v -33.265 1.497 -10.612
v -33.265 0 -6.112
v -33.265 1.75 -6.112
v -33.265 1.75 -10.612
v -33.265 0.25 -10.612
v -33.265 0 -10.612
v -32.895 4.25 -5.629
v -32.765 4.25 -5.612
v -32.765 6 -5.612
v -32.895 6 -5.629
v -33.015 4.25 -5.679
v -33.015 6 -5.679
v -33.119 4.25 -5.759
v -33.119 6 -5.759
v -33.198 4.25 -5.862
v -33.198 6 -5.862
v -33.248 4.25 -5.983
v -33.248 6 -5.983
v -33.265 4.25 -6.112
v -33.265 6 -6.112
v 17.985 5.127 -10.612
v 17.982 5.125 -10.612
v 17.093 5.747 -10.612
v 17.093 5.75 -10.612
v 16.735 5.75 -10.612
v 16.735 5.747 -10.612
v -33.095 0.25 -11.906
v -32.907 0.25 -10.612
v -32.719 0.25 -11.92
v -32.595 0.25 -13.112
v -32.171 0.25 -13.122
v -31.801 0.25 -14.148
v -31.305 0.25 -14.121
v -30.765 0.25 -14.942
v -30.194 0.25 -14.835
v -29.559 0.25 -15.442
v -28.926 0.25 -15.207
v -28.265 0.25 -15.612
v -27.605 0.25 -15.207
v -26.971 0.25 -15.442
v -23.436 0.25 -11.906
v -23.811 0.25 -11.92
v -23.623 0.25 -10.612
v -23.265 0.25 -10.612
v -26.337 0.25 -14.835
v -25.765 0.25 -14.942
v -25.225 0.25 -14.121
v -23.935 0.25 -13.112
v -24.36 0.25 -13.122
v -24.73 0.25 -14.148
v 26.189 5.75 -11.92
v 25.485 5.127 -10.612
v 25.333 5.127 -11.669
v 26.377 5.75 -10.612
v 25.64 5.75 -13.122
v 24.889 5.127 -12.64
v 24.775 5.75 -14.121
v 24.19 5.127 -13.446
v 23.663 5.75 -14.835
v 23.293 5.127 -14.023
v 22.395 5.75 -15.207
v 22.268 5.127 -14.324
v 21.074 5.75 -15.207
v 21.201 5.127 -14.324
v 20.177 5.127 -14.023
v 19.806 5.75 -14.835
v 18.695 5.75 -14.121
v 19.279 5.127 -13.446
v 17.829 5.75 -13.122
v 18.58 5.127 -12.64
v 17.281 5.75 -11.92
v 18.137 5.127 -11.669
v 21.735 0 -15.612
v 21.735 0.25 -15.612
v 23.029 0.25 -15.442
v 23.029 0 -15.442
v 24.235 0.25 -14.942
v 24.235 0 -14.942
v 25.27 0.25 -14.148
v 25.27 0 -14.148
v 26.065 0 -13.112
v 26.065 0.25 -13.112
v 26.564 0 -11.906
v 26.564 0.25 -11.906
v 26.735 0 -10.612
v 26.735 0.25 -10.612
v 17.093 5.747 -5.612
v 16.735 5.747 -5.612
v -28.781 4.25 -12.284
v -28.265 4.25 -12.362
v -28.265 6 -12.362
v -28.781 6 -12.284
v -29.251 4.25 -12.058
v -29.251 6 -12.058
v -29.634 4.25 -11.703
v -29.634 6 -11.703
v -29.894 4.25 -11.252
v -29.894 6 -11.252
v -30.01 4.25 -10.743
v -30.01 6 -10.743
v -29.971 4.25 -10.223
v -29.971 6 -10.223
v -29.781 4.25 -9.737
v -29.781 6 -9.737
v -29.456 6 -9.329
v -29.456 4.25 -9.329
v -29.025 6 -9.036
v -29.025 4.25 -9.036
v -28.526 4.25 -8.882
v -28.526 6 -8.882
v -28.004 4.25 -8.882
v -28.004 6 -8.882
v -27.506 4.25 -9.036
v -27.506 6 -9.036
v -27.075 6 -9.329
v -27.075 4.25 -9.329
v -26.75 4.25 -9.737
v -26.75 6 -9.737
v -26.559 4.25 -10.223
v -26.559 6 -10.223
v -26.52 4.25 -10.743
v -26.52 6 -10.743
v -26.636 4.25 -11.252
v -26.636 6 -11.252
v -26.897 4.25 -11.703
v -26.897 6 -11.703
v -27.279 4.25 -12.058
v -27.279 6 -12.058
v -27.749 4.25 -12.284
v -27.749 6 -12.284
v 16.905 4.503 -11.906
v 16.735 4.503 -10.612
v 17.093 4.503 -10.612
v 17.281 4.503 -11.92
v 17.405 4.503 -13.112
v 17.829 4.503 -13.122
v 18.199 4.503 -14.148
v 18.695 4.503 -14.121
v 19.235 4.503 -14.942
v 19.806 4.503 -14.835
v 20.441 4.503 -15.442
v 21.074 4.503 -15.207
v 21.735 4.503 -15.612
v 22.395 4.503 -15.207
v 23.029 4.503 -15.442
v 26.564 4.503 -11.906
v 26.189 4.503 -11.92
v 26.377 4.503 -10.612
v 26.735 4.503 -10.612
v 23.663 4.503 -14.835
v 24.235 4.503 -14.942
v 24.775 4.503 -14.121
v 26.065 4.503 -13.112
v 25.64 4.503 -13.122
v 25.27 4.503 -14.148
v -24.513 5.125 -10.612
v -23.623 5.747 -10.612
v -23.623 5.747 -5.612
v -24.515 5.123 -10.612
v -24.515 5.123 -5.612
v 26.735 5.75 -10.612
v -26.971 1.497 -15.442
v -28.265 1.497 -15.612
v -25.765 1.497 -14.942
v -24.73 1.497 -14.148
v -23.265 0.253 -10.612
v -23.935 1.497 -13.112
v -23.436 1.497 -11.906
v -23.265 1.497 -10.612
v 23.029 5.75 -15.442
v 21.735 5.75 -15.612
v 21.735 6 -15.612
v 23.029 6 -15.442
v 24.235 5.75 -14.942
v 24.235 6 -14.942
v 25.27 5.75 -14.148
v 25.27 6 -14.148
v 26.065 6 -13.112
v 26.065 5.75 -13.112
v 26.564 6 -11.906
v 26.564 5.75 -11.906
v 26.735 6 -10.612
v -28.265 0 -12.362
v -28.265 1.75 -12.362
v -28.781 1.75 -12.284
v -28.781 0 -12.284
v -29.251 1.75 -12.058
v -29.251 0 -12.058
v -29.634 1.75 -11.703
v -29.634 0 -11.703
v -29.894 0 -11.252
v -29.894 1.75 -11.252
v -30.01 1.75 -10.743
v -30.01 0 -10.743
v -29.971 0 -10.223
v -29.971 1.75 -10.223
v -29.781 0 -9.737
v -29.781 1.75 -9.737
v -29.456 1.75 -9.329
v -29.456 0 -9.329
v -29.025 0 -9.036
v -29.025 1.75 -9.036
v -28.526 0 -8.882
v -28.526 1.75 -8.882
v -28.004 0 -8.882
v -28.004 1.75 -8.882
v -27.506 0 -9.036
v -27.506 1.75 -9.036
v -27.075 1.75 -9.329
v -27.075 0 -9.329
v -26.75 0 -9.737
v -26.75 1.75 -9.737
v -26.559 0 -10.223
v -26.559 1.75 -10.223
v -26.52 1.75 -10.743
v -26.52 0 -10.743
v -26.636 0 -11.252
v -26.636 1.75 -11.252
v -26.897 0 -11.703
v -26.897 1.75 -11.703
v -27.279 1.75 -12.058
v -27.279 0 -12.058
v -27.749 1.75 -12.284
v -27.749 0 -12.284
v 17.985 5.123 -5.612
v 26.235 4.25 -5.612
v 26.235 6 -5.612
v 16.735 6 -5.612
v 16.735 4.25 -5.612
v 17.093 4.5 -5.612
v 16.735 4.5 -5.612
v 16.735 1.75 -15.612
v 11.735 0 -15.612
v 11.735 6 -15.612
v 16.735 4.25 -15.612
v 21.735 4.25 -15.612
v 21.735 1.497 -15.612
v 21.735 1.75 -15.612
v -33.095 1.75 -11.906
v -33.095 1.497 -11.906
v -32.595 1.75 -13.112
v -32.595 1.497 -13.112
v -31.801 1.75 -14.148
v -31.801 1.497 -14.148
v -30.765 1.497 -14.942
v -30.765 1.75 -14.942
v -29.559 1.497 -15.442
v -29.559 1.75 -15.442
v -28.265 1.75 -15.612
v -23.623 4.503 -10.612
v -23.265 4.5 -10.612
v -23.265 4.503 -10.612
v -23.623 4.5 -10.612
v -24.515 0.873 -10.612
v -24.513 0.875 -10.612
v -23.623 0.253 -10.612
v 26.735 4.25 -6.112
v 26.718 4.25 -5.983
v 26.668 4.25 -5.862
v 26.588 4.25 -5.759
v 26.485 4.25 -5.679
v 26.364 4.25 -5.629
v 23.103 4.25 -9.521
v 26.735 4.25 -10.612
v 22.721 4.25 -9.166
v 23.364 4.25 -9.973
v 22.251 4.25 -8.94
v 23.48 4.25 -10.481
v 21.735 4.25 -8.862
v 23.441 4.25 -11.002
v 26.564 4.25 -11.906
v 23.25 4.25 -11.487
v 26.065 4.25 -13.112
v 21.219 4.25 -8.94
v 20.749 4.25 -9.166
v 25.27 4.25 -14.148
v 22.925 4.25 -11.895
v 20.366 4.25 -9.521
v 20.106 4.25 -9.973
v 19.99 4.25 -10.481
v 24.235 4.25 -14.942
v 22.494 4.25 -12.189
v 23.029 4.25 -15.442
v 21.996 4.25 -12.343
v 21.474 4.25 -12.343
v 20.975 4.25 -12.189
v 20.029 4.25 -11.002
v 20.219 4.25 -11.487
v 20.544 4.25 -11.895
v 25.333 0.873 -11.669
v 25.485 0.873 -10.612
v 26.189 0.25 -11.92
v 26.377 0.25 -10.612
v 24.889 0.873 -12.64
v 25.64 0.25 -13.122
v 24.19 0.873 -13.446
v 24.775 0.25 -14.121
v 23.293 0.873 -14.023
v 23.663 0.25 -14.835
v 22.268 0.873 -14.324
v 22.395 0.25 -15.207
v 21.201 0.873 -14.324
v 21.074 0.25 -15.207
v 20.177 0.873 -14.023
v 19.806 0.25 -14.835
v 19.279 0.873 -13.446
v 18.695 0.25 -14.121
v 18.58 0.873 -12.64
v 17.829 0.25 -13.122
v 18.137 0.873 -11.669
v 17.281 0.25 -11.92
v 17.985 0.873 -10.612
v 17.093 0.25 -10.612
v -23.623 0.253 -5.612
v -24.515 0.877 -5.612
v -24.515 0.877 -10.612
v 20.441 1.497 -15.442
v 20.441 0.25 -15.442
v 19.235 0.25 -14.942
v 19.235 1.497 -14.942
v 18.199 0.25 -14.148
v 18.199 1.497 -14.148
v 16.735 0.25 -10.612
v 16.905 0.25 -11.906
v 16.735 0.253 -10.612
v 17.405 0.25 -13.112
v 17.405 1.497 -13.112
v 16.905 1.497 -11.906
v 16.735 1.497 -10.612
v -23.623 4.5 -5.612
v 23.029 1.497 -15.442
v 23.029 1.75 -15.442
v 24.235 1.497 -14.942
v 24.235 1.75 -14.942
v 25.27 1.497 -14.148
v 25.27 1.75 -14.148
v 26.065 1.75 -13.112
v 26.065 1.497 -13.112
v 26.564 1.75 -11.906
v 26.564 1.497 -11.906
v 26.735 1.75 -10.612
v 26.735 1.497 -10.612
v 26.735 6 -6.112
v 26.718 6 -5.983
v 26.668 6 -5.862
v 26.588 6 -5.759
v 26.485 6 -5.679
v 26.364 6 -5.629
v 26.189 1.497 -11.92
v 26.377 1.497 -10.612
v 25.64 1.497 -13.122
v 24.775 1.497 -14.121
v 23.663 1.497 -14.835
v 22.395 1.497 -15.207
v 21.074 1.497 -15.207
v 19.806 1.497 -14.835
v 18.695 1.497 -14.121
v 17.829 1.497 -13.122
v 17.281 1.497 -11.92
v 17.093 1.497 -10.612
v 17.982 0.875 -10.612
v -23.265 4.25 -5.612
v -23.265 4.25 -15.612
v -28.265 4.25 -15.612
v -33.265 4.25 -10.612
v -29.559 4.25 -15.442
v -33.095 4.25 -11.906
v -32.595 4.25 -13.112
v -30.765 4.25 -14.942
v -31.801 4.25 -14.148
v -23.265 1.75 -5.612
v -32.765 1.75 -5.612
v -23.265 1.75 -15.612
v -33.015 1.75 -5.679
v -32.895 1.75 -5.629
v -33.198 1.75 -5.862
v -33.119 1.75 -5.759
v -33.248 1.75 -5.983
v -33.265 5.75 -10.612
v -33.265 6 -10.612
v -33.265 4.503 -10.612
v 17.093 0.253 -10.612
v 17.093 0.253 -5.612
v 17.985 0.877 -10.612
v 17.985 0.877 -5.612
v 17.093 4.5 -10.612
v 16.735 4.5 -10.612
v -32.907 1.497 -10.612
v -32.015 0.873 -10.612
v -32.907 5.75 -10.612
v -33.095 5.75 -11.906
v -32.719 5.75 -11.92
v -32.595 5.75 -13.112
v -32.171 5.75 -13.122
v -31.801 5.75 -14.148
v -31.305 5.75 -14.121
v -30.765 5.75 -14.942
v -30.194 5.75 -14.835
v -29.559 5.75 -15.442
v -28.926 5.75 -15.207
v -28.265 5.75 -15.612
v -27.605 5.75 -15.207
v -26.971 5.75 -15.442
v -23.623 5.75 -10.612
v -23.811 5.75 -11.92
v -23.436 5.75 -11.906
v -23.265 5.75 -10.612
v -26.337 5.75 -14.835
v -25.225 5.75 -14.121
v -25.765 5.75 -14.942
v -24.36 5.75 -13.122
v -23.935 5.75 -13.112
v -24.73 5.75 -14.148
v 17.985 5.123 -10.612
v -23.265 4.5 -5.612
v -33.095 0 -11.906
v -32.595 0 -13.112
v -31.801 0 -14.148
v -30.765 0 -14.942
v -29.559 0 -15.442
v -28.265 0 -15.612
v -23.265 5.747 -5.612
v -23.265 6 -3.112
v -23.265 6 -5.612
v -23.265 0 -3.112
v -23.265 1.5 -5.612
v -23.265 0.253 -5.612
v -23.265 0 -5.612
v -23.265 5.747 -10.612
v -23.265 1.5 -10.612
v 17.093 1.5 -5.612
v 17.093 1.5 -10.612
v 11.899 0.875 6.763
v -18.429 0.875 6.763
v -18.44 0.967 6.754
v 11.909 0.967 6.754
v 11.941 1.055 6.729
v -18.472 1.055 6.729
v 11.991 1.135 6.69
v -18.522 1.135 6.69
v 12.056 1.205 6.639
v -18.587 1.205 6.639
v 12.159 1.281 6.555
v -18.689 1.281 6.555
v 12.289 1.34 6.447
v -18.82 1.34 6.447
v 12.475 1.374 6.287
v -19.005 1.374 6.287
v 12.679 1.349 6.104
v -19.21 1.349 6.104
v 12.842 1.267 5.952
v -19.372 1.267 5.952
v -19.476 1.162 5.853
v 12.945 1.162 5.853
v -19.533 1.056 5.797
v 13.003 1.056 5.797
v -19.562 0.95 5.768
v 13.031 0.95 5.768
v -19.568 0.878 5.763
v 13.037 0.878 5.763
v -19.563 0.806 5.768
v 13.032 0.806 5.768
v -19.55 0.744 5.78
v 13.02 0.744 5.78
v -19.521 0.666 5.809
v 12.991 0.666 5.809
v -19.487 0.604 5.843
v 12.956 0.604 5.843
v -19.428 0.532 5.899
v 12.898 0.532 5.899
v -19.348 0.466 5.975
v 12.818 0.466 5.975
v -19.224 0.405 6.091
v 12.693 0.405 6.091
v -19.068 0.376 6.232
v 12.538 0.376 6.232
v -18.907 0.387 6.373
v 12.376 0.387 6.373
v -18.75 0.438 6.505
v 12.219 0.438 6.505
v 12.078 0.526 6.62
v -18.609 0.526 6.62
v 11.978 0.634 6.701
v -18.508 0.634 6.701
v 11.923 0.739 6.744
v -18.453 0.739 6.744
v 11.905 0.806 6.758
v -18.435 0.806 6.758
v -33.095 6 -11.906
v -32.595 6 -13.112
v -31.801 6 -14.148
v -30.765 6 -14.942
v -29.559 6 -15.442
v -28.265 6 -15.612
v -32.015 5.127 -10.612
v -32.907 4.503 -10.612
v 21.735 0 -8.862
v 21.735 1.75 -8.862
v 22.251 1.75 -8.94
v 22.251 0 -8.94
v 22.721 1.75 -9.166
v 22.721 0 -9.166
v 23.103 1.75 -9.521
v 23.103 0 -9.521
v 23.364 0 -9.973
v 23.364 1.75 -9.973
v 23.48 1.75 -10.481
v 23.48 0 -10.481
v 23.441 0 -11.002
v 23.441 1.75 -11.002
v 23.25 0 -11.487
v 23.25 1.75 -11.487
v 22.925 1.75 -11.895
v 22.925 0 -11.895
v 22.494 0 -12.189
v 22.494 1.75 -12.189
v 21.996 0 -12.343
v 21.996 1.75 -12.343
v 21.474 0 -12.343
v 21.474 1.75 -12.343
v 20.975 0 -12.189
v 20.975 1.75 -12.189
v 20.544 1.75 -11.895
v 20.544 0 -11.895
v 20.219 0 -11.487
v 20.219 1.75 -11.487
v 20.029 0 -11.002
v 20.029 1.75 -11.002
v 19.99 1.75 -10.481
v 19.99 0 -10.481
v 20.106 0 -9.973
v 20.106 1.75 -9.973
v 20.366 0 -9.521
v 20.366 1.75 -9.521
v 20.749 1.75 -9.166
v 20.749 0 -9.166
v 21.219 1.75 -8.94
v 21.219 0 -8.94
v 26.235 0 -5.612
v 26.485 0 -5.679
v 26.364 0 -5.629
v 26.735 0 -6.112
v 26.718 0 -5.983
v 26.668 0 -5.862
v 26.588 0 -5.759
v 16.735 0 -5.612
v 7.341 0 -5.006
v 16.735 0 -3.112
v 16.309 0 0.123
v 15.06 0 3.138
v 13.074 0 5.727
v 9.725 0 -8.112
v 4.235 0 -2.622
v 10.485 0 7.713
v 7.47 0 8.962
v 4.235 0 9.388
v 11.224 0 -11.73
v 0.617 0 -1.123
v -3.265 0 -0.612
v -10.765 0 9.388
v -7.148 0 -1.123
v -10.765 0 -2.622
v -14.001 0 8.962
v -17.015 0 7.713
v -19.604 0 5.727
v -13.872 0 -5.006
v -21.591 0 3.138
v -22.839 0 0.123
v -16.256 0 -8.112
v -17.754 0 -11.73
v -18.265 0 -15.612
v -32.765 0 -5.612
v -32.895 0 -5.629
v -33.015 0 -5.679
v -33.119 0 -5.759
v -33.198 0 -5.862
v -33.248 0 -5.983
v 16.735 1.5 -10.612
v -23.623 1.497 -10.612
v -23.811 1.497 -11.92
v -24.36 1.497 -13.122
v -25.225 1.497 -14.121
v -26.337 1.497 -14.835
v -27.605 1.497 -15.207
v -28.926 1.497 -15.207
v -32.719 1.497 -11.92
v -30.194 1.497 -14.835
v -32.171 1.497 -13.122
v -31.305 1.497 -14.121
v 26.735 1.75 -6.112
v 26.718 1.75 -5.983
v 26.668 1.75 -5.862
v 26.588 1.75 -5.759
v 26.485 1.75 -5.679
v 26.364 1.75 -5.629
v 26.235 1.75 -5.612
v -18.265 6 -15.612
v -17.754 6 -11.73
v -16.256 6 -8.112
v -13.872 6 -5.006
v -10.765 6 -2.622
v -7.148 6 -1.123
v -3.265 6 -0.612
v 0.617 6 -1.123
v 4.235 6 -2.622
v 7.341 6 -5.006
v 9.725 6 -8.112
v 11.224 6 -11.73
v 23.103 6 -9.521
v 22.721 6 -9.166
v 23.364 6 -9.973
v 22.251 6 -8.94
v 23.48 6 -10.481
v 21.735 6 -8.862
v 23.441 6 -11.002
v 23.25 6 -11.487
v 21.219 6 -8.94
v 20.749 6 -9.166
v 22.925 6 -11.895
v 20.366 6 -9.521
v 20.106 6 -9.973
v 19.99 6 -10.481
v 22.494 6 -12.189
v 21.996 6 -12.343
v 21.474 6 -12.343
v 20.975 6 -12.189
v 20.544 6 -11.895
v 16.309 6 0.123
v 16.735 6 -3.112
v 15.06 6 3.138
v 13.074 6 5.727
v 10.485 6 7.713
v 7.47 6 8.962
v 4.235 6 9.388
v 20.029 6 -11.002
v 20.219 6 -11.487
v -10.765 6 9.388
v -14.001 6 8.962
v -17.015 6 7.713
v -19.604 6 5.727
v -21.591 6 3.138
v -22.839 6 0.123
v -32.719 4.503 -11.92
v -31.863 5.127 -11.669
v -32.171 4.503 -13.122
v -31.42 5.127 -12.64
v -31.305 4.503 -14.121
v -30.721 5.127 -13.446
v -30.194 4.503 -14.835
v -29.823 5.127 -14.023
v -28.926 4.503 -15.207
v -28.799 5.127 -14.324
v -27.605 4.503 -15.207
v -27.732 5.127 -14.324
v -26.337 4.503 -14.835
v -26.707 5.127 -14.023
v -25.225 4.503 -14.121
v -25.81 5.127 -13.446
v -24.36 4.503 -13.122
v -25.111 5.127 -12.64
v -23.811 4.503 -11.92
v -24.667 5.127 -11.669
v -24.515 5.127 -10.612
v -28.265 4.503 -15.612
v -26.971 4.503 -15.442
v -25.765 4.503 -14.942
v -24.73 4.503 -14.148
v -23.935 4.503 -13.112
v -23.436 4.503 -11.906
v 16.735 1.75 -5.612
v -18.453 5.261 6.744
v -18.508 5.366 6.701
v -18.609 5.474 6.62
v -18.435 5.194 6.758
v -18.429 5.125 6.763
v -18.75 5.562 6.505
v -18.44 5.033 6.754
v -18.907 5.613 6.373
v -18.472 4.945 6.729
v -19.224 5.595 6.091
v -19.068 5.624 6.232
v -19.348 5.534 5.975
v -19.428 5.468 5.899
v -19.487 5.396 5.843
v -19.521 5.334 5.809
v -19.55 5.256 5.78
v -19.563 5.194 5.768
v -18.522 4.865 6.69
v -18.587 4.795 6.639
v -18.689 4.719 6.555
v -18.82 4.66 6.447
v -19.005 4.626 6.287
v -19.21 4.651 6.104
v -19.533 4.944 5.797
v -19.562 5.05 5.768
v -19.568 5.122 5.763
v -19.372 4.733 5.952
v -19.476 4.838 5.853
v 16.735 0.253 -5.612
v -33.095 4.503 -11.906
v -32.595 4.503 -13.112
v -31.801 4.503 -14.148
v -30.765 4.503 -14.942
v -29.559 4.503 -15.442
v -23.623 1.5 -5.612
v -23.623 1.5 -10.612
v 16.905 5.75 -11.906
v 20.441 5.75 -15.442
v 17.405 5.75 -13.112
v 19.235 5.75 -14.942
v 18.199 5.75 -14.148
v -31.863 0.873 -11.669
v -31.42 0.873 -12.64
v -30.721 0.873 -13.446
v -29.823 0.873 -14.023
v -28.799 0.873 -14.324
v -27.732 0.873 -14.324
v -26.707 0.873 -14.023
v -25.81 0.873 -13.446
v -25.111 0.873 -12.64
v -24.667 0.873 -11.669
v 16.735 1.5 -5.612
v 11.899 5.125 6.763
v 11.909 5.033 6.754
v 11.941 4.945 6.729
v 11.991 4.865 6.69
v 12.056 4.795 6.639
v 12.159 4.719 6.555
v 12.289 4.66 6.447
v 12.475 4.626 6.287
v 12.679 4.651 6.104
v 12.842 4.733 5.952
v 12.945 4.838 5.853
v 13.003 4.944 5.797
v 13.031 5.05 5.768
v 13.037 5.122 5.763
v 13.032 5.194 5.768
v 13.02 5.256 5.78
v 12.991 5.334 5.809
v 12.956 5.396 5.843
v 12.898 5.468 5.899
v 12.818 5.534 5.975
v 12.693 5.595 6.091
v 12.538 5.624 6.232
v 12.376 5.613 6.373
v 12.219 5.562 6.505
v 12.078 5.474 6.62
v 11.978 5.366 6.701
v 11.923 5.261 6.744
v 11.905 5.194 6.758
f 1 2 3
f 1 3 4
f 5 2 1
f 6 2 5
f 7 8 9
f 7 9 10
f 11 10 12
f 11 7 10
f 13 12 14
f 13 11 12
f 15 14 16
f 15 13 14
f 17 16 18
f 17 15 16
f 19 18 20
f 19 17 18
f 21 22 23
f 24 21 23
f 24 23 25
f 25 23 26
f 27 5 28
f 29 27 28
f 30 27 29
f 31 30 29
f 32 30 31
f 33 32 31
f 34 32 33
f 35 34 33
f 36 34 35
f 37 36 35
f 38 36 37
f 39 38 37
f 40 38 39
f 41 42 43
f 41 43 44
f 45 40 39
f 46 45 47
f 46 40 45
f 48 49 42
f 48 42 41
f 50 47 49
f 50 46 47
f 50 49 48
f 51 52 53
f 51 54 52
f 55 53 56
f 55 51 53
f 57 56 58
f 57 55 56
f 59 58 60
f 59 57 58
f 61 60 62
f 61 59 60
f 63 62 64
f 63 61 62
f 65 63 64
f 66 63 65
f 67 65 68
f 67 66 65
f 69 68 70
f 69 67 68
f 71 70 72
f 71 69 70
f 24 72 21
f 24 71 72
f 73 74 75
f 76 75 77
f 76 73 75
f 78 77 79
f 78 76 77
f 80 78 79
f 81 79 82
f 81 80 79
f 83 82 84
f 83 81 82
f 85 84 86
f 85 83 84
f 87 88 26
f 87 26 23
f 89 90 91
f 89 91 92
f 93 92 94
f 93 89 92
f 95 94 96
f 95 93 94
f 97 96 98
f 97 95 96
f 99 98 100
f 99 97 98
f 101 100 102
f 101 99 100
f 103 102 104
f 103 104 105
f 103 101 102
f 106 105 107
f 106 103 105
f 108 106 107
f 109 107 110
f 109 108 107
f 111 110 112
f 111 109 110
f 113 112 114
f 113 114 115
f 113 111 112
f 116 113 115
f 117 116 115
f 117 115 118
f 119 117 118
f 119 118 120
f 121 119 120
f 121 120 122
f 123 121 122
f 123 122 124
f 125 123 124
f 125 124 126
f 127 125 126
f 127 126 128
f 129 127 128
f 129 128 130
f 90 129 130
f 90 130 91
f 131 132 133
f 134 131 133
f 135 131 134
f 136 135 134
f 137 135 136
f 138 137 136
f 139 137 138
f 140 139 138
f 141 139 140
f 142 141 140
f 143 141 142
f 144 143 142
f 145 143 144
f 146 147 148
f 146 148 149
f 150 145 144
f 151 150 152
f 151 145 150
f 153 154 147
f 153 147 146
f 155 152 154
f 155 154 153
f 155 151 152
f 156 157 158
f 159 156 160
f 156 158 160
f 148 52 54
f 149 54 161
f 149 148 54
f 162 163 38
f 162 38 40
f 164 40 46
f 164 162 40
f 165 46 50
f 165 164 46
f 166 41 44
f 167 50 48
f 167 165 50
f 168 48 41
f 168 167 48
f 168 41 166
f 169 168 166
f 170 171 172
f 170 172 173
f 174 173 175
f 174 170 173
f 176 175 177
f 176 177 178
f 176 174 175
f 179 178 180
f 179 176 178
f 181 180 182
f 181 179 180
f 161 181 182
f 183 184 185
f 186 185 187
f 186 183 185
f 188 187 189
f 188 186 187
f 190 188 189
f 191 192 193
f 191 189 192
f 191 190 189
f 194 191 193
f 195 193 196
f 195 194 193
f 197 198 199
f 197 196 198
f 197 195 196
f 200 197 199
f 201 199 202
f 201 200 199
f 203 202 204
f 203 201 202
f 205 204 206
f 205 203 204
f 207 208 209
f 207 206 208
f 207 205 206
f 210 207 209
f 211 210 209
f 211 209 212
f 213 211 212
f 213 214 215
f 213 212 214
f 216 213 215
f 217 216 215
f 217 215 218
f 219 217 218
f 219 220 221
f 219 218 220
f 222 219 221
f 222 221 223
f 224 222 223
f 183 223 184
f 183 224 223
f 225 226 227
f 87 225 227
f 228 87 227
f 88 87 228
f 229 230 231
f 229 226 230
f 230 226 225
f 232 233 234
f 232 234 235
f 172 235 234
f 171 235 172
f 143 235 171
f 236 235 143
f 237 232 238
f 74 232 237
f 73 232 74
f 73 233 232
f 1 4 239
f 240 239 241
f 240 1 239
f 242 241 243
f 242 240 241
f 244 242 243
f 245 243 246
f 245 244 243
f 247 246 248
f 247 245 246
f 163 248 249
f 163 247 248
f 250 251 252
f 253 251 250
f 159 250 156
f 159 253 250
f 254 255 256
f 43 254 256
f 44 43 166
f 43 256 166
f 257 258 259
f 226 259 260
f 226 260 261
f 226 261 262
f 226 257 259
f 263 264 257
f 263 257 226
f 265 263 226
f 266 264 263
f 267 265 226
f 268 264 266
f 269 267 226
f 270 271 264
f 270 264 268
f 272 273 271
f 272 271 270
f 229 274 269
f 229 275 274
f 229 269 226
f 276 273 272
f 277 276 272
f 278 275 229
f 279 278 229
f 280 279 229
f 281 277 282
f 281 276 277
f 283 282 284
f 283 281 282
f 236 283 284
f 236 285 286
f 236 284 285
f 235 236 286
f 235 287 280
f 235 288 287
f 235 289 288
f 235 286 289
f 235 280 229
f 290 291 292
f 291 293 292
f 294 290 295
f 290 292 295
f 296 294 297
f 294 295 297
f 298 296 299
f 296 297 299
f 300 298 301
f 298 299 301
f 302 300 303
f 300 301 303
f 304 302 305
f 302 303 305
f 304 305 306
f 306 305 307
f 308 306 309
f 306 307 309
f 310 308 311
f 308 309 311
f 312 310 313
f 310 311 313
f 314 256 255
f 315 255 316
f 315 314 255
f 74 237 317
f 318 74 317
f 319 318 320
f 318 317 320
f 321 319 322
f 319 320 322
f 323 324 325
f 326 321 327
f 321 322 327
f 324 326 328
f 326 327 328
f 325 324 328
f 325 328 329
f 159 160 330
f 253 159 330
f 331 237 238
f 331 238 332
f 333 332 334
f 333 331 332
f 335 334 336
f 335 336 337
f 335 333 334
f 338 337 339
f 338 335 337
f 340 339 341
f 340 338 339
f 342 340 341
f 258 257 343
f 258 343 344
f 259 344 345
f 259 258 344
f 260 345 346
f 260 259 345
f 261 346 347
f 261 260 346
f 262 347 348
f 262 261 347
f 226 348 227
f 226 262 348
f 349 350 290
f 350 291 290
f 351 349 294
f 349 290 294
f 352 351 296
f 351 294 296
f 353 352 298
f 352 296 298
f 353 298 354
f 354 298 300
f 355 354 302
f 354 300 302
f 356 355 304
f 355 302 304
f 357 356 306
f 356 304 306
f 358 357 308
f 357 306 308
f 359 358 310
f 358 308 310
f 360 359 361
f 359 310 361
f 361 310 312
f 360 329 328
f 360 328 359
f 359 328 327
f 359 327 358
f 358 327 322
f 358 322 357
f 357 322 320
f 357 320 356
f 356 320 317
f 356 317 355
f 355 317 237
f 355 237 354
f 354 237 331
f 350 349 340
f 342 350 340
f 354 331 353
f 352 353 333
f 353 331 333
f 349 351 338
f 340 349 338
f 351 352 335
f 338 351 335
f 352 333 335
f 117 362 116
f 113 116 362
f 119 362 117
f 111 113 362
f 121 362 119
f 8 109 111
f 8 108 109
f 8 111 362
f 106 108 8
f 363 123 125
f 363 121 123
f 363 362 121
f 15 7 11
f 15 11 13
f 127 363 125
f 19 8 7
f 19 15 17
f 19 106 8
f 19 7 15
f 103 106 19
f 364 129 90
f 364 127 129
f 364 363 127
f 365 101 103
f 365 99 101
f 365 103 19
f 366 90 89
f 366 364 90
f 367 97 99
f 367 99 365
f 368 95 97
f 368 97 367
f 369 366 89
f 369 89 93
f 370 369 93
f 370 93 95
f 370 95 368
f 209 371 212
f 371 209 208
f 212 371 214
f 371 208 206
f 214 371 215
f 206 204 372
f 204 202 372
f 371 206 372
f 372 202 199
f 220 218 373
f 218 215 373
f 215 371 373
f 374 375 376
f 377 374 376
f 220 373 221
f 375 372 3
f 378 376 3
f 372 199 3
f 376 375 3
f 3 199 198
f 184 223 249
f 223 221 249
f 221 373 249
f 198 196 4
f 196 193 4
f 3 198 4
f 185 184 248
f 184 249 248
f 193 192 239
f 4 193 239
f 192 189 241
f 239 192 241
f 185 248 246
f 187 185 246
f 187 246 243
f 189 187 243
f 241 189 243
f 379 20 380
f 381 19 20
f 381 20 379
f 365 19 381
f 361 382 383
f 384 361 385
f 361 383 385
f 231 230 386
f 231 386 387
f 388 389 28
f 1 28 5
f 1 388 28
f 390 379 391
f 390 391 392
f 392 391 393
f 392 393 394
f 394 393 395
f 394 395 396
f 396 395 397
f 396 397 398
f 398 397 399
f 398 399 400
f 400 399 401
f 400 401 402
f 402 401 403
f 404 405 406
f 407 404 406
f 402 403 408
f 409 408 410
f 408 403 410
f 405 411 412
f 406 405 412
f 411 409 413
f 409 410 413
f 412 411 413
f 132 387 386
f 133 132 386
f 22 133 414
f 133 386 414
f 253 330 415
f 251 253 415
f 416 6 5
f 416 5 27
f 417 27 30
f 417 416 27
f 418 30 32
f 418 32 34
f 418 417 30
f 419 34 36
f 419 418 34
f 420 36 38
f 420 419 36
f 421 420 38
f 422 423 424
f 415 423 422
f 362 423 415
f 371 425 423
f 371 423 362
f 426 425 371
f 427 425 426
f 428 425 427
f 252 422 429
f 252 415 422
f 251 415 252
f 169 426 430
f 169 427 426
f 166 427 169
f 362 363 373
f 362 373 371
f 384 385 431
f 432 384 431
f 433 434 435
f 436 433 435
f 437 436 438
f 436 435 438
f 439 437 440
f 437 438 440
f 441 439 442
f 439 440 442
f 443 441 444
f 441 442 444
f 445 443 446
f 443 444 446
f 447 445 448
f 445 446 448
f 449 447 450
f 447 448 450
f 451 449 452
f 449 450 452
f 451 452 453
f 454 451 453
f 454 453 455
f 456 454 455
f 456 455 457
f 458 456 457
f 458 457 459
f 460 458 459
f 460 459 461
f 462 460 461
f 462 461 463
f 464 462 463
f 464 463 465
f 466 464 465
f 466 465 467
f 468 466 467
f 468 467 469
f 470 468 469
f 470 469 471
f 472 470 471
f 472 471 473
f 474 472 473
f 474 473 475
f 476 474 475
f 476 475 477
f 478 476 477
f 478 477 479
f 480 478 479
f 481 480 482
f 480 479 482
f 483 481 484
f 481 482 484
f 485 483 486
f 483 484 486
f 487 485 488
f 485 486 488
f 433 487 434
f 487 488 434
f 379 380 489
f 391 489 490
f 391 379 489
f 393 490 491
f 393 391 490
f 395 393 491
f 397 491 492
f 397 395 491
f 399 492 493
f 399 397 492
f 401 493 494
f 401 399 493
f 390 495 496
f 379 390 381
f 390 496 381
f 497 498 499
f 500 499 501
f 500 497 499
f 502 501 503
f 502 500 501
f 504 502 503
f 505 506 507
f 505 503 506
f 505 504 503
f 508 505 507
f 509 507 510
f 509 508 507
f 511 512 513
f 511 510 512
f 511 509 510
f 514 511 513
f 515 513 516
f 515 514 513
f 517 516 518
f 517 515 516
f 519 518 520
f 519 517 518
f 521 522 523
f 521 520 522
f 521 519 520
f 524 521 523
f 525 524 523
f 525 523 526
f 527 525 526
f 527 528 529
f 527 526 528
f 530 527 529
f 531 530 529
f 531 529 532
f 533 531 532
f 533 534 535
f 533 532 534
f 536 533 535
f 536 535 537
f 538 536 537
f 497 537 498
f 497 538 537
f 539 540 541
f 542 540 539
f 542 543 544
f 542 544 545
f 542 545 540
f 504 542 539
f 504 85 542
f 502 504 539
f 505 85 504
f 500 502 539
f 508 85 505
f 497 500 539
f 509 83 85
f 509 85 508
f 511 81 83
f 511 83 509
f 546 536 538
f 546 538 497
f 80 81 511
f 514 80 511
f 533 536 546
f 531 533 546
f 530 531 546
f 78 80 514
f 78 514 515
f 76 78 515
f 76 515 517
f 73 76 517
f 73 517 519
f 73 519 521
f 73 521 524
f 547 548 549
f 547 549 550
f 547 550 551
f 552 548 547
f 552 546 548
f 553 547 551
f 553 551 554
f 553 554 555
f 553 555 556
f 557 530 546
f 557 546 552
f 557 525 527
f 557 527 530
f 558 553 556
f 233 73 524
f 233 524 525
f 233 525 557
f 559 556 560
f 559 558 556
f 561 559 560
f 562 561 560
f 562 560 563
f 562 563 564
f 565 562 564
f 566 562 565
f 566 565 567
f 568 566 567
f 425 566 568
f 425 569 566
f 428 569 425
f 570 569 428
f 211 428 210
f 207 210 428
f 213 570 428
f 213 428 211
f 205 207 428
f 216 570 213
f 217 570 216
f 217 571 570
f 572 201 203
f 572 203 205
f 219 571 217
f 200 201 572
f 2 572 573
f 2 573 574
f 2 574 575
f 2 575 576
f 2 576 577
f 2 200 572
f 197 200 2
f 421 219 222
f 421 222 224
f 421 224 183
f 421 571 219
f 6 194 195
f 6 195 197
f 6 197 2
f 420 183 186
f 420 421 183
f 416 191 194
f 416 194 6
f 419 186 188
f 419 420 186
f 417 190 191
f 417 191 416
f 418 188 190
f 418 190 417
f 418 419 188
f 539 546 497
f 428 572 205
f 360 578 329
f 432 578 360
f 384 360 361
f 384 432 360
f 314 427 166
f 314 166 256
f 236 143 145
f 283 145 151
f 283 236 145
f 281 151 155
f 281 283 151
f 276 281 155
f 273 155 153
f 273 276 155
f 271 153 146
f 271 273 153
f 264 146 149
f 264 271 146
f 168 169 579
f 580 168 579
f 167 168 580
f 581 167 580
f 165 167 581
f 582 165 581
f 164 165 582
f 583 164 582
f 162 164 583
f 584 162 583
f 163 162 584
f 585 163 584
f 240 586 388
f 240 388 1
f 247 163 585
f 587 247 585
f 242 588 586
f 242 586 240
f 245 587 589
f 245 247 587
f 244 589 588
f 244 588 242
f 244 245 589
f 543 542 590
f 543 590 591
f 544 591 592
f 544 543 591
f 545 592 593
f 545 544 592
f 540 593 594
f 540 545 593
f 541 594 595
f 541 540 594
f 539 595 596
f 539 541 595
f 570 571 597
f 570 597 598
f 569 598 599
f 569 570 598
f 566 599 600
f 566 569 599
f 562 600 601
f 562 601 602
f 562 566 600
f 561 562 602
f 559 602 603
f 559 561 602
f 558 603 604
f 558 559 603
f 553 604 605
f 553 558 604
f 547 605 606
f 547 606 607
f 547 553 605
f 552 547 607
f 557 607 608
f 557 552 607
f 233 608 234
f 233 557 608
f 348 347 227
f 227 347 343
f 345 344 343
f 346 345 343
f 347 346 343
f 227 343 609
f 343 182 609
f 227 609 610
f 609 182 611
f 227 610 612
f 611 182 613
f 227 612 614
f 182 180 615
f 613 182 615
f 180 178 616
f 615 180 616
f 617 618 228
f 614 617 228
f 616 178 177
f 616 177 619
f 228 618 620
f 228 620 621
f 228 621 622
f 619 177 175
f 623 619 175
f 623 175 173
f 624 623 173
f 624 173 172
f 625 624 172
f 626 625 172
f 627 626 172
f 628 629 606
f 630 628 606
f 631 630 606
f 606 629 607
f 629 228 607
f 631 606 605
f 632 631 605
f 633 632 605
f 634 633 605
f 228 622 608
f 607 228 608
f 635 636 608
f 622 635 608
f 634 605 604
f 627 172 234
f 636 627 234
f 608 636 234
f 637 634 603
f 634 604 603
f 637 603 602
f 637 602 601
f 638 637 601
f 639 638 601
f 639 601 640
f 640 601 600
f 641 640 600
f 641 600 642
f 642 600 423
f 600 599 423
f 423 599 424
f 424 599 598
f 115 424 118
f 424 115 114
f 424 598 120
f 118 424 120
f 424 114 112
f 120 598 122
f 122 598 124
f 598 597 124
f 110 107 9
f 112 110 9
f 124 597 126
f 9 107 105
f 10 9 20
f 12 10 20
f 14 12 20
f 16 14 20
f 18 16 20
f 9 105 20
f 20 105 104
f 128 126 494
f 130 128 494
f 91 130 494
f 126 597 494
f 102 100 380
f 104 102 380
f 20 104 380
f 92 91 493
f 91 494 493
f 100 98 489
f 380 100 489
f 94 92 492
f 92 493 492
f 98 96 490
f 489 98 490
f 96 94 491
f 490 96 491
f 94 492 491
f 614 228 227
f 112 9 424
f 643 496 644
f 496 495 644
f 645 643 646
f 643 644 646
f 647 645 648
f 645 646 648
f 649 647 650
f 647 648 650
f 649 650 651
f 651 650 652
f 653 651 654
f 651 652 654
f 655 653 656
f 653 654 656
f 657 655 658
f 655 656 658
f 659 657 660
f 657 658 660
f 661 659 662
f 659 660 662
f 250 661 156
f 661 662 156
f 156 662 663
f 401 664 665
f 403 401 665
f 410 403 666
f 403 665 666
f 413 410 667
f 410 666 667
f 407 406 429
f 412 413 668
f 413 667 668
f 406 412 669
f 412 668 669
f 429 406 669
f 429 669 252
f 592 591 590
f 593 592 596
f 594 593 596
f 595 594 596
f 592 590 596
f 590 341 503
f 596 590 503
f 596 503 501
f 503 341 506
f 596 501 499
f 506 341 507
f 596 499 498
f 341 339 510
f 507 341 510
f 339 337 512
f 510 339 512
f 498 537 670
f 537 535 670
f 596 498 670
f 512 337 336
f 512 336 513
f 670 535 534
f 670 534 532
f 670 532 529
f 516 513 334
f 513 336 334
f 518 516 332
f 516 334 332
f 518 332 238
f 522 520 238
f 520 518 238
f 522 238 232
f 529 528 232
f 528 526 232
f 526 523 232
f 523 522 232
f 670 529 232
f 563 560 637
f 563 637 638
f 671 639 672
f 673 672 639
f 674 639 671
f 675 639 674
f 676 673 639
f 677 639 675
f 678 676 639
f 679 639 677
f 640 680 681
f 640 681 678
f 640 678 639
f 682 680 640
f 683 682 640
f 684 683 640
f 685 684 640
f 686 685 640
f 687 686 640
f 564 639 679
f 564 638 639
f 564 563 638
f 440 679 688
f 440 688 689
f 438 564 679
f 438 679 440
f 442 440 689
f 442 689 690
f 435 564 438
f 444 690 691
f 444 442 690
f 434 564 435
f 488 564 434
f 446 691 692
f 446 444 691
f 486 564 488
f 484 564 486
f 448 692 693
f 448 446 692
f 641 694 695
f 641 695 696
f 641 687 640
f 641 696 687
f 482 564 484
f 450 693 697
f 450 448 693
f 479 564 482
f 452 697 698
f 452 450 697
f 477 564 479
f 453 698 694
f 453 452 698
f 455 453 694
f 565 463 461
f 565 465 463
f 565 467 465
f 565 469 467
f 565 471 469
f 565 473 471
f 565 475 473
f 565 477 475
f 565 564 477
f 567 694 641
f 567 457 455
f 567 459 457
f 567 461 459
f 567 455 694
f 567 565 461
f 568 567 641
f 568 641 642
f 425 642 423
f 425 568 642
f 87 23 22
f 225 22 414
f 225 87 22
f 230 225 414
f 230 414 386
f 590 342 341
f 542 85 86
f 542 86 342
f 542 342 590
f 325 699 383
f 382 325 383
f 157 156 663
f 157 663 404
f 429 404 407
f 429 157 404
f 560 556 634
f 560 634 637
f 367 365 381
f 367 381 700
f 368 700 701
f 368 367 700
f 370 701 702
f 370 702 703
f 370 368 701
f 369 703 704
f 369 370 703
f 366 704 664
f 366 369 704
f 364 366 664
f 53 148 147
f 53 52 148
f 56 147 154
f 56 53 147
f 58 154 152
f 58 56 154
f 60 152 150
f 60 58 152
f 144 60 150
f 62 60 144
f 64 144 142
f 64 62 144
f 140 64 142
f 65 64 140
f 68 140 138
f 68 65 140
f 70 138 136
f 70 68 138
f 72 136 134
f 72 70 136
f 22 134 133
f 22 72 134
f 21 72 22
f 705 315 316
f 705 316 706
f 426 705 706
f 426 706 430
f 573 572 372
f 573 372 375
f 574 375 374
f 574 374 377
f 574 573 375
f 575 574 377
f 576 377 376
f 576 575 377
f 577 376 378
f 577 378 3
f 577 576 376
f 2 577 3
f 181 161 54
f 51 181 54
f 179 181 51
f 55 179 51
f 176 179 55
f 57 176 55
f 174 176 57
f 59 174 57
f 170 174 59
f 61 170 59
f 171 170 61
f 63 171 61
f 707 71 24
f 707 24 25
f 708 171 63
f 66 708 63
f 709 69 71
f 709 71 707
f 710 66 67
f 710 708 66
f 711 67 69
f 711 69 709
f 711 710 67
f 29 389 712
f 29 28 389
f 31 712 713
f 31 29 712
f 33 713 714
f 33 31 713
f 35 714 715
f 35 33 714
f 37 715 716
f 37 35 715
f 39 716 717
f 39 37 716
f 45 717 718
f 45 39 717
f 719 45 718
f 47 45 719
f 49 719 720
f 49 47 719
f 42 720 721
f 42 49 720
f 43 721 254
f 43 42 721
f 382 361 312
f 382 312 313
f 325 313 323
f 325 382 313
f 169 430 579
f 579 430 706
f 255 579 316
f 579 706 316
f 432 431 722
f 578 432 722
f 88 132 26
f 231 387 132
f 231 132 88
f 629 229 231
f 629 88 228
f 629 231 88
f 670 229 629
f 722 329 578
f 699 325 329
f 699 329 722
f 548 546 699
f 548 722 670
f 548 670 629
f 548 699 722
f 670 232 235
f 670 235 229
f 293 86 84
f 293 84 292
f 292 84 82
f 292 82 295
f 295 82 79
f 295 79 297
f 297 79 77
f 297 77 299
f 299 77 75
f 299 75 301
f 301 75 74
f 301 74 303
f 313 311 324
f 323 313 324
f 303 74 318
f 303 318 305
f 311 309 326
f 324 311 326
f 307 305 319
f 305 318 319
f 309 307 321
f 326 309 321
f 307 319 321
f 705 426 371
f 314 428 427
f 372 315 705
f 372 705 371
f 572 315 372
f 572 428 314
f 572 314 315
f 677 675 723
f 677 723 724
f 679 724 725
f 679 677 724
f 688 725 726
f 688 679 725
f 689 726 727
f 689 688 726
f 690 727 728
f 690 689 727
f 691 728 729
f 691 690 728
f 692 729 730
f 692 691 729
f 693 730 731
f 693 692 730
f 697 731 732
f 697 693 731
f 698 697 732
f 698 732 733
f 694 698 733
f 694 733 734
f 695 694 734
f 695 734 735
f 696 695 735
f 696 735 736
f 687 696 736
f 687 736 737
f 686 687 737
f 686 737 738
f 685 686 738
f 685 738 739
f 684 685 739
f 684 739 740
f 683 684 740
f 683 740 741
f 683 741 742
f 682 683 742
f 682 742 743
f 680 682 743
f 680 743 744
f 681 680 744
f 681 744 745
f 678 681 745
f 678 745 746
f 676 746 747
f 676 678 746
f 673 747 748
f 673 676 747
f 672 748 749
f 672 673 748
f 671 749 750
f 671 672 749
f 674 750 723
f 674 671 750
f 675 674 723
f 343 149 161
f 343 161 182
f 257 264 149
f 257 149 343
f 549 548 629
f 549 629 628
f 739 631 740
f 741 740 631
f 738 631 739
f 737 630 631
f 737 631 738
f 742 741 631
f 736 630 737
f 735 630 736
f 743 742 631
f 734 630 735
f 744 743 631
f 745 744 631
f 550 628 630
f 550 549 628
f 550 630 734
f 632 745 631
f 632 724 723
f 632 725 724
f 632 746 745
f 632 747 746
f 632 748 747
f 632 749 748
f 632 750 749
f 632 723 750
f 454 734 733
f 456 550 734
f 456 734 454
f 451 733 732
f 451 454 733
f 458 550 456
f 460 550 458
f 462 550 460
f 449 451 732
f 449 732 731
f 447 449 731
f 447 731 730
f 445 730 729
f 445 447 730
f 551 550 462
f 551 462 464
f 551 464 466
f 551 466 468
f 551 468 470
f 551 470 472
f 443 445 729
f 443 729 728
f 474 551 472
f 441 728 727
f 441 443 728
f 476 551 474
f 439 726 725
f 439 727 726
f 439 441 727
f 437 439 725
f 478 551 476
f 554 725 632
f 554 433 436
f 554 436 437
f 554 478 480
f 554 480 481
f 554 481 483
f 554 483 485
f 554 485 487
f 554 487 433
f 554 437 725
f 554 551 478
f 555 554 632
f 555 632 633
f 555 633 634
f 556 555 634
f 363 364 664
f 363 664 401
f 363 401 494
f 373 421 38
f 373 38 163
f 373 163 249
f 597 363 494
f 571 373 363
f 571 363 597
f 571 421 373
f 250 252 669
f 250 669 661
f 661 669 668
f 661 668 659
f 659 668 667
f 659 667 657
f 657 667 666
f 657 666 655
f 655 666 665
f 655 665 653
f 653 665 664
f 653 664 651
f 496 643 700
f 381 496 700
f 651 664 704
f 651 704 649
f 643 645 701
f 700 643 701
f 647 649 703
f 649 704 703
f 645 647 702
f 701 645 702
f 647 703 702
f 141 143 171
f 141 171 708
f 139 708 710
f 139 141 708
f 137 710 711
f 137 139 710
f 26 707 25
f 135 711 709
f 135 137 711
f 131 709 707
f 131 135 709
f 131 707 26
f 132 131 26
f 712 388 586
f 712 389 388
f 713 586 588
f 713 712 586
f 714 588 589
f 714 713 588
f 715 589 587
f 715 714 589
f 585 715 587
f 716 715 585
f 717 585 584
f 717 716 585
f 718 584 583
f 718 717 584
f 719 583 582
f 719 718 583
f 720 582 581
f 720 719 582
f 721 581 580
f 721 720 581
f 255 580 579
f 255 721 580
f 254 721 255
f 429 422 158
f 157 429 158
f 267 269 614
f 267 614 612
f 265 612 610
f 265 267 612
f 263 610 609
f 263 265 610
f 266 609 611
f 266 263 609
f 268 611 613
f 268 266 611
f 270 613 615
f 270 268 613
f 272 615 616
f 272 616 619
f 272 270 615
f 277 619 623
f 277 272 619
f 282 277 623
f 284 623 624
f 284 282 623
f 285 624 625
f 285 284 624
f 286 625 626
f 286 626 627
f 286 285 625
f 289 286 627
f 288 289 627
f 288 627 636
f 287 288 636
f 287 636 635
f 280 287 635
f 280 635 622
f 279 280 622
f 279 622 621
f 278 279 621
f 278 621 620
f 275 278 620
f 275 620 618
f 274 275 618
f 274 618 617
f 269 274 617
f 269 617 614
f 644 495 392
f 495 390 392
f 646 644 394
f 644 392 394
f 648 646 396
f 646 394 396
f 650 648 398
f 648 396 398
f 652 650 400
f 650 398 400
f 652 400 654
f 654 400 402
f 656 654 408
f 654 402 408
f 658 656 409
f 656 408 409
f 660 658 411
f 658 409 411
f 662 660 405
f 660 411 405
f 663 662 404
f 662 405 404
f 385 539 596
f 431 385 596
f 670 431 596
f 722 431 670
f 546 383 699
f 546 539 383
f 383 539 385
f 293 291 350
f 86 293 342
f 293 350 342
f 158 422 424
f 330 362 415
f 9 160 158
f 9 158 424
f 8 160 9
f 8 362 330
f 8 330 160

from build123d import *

# Parameters (mm, degrees)
SKETCH3_R            = 1.75
BOSS_EXTRUDE1_DEPTH  = 6
SKETCH4_W            = 10
SKETCH4_H            = 2.5
CUT_EXTRUDE1_DEPTH   = 10
CUT_REVOLVE1_ANGLE   = 180
CUT_EXTRUDE2_DEPTH   = 5
SKETCH10_R           = 0.5
CUT_EXTRUDE3_DEPTH   = 40
MIRROR6_COPY_1_ANGLE = 180
MIRROR6_COPY_2_DEPTH = 5
CUT_EXTRUDE4_DEPTH   = 6


with BuildPart() as part:
    # Sketch3 → Boss-Extrude1 (new body)
    with BuildSketch(Plane(origin=(0, 0, 0), x_dir=(1, 0, 0), z_dir=(0, 1, 0))):
        with BuildLine():
            Line((-23.265306122, 15.612244898), (16.734693878, 15.612244898))
            Line((16.734693878, 15.612244898), (21.734693878, 15.612244898))
            ThreePointArc((21.734693878, 15.612244898), (25.270227783, 14.147778804), (26.734693878, 10.612244898))
            Line((26.734693878, 10.612244898), (26.734693878, 6.112244898))
            ThreePointArc((26.734693878, 6.112244898), (26.588247268, 5.758691507), (26.234693878, 5.612244898))
            Line((26.234693878, 5.612244898), (16.734693878, 5.612244898))
            Line((16.734693878, 5.612244898), (16.734693878, 3.112244898))
            ThreePointArc((16.734693878, 3.112244898), (13.073528642, -5.726589867), (4.234693878, -9.387755102))
            Line((4.234693878, -9.387755102), (-10.765306122, -9.387755102))
            ThreePointArc((-10.765306122, -9.387755102), (-19.604140887, -5.726589867), (-23.265306122, 3.112244898))
            Line((-23.265306122, 3.112244898), (-23.265306122, 5.612244898))
            Line((-23.265306122, 5.612244898), (-32.765306122, 5.612244898))
            ThreePointArc((-32.765306122, 5.612244898), (-33.118859513, 5.758691507), (-33.265306122, 6.112244898))
            Line((-33.265306122, 6.112244898), (-33.265306122, 10.612244898))
            ThreePointArc((-33.265306122, 10.612244898), (-31.800840028, 14.147778804), (-28.265306122, 15.612244898))
            Line((-28.265306122, 15.612244898), (-23.265306122, 15.612244898))
        make_face()
        with Locations((21.734693878, 10.612244898)):
            Circle(SKETCH3_R, mode=Mode.SUBTRACT)
        with Locations((-28.265306122, 10.612244898)):
            Circle(SKETCH3_R, mode=Mode.SUBTRACT)
    extrude(amount=BOSS_EXTRUDE1_DEPTH)

    # Sketch4 → Cut-Extrude1 (cut)
    with BuildSketch(Plane(origin=(0, 0, -15.612244898), x_dir=(-1, 0, 0), z_dir=(0, 0, -1))):
        with Locations((28.265306122, 3)):
            Rectangle(SKETCH4_W, SKETCH4_H)
        with Locations((-21.734693878, 3)):
            Rectangle(SKETCH4_W, SKETCH4_H)
    extrude(amount=-CUT_EXTRUDE1_DEPTH, mode=Mode.SUBTRACT)

    # Sketch7 → Cut-Revolve1 (revolve, cut)
    with BuildSketch(Plane.XY.offset(-10.612244898)):
        Polygon((-33.265306122, 1.496669927), (-32.907482363, 1.496669927), (-32.015306122, 0.873334963), (-32.907482363, 0.25), (-33.265306122, 0.25), align=None)
    cut_revolve1 = revolve(axis=Axis((-28.265306122, 1.746669927, -10.612244898), (0, -1, 0)), revolution_arc=CUT_REVOLVE1_ANGLE, mode=Mode.SUBTRACT)

    # Sketch9 → Cut-Extrude2 (cut)
    with BuildSketch(Plane.XY.offset(-5.612244898)):
        Polygon((-23.623129882, 0.253330073), (-24.515306122, 0.876665037), (-23.623129882, 1.5), (-23.265306122, 1.5), (-23.265306122, 0.253330073), align=None)
    cut_extrude2 = extrude(amount=-CUT_EXTRUDE2_DEPTH, mode=Mode.SUBTRACT)

    # Sketch10 → Cut-Extrude3 (cut)
    with BuildSketch(Plane.ZY.offset(23.265306122)):
        with Locations((6.262755102, 0.875)):
            Circle(SKETCH10_R)
    cut_extrude3 = extrude(amount=-CUT_EXTRUDE3_DEPTH, mode=Mode.SUBTRACT)

    # Mirror5: Cut-Revolve1, Cut-Extrude2 across plane
    add(cut_revolve1.mirror(Plane.ZY.offset(3.265306122)), mode=Mode.SUBTRACT)
    add(cut_extrude2.mirror(Plane.ZY.offset(3.265306122)), mode=Mode.SUBTRACT)

    # Mirror6: Cut-Revolve1, Cut-Extrude2, Cut-Extrude3 across plane
    add(cut_revolve1.mirror(Plane.ZX.offset(3)), mode=Mode.SUBTRACT)
    add(cut_extrude2.mirror(Plane.ZX.offset(3)), mode=Mode.SUBTRACT)
    add(cut_extrude3.mirror(Plane.ZX.offset(3)), mode=Mode.SUBTRACT)

    # Mirror6 copy 1 sketch → Mirror6 copy 1 (revolve, cut)
    with BuildSketch(Plane(origin=(-6.530612245, 6, -10.612244898), x_dir=(-1, 0, 0), z_dir=(0, 0, 1))):
        Polygon((-33.265306122, 1.496669927), (-32.907482363, 1.496669927), (-32.015306122, 0.873334963), (-32.907482363, 0.25), (-33.265306122, 0.25), align=None)
    revolve(axis=Axis((21.734693878, 4.253330073, -10.612244898), (0, 1, 0)), revolution_arc=MIRROR6_COPY_1_ANGLE, mode=Mode.SUBTRACT)

    # Mirror6 copy 2 sketch → Mirror6 copy 2 (cut)
    with BuildSketch(Plane(origin=(-6.530612245, 6, -5.612244898), x_dir=(-1, 0, 0), z_dir=(0, 0, 1))):
        Polygon((-23.623129882, 0.253330073), (-24.515306122, 0.876665037), (-23.623129882, 1.5), (-23.265306122, 1.5), (-23.265306122, 0.253330073), align=None)
    extrude(amount=-MIRROR6_COPY_2_DEPTH, mode=Mode.SUBTRACT)

    # Sketch11 → Cut-Extrude4 (cut)
    with BuildSketch(Plane.XZ):
        with BuildLine():
            Line((11.734693878, -15.612244898), (-18.265306122, -15.612244898))
            ThreePointArc((-18.265306122, -15.612244898), (-3.265306122, -0.612244898), (11.734693878, -15.612244898))
        make_face()
    extrude(amount=-CUT_EXTRUDE4_DEPTH, mode=Mode.SUBTRACT)


solid = part.part
